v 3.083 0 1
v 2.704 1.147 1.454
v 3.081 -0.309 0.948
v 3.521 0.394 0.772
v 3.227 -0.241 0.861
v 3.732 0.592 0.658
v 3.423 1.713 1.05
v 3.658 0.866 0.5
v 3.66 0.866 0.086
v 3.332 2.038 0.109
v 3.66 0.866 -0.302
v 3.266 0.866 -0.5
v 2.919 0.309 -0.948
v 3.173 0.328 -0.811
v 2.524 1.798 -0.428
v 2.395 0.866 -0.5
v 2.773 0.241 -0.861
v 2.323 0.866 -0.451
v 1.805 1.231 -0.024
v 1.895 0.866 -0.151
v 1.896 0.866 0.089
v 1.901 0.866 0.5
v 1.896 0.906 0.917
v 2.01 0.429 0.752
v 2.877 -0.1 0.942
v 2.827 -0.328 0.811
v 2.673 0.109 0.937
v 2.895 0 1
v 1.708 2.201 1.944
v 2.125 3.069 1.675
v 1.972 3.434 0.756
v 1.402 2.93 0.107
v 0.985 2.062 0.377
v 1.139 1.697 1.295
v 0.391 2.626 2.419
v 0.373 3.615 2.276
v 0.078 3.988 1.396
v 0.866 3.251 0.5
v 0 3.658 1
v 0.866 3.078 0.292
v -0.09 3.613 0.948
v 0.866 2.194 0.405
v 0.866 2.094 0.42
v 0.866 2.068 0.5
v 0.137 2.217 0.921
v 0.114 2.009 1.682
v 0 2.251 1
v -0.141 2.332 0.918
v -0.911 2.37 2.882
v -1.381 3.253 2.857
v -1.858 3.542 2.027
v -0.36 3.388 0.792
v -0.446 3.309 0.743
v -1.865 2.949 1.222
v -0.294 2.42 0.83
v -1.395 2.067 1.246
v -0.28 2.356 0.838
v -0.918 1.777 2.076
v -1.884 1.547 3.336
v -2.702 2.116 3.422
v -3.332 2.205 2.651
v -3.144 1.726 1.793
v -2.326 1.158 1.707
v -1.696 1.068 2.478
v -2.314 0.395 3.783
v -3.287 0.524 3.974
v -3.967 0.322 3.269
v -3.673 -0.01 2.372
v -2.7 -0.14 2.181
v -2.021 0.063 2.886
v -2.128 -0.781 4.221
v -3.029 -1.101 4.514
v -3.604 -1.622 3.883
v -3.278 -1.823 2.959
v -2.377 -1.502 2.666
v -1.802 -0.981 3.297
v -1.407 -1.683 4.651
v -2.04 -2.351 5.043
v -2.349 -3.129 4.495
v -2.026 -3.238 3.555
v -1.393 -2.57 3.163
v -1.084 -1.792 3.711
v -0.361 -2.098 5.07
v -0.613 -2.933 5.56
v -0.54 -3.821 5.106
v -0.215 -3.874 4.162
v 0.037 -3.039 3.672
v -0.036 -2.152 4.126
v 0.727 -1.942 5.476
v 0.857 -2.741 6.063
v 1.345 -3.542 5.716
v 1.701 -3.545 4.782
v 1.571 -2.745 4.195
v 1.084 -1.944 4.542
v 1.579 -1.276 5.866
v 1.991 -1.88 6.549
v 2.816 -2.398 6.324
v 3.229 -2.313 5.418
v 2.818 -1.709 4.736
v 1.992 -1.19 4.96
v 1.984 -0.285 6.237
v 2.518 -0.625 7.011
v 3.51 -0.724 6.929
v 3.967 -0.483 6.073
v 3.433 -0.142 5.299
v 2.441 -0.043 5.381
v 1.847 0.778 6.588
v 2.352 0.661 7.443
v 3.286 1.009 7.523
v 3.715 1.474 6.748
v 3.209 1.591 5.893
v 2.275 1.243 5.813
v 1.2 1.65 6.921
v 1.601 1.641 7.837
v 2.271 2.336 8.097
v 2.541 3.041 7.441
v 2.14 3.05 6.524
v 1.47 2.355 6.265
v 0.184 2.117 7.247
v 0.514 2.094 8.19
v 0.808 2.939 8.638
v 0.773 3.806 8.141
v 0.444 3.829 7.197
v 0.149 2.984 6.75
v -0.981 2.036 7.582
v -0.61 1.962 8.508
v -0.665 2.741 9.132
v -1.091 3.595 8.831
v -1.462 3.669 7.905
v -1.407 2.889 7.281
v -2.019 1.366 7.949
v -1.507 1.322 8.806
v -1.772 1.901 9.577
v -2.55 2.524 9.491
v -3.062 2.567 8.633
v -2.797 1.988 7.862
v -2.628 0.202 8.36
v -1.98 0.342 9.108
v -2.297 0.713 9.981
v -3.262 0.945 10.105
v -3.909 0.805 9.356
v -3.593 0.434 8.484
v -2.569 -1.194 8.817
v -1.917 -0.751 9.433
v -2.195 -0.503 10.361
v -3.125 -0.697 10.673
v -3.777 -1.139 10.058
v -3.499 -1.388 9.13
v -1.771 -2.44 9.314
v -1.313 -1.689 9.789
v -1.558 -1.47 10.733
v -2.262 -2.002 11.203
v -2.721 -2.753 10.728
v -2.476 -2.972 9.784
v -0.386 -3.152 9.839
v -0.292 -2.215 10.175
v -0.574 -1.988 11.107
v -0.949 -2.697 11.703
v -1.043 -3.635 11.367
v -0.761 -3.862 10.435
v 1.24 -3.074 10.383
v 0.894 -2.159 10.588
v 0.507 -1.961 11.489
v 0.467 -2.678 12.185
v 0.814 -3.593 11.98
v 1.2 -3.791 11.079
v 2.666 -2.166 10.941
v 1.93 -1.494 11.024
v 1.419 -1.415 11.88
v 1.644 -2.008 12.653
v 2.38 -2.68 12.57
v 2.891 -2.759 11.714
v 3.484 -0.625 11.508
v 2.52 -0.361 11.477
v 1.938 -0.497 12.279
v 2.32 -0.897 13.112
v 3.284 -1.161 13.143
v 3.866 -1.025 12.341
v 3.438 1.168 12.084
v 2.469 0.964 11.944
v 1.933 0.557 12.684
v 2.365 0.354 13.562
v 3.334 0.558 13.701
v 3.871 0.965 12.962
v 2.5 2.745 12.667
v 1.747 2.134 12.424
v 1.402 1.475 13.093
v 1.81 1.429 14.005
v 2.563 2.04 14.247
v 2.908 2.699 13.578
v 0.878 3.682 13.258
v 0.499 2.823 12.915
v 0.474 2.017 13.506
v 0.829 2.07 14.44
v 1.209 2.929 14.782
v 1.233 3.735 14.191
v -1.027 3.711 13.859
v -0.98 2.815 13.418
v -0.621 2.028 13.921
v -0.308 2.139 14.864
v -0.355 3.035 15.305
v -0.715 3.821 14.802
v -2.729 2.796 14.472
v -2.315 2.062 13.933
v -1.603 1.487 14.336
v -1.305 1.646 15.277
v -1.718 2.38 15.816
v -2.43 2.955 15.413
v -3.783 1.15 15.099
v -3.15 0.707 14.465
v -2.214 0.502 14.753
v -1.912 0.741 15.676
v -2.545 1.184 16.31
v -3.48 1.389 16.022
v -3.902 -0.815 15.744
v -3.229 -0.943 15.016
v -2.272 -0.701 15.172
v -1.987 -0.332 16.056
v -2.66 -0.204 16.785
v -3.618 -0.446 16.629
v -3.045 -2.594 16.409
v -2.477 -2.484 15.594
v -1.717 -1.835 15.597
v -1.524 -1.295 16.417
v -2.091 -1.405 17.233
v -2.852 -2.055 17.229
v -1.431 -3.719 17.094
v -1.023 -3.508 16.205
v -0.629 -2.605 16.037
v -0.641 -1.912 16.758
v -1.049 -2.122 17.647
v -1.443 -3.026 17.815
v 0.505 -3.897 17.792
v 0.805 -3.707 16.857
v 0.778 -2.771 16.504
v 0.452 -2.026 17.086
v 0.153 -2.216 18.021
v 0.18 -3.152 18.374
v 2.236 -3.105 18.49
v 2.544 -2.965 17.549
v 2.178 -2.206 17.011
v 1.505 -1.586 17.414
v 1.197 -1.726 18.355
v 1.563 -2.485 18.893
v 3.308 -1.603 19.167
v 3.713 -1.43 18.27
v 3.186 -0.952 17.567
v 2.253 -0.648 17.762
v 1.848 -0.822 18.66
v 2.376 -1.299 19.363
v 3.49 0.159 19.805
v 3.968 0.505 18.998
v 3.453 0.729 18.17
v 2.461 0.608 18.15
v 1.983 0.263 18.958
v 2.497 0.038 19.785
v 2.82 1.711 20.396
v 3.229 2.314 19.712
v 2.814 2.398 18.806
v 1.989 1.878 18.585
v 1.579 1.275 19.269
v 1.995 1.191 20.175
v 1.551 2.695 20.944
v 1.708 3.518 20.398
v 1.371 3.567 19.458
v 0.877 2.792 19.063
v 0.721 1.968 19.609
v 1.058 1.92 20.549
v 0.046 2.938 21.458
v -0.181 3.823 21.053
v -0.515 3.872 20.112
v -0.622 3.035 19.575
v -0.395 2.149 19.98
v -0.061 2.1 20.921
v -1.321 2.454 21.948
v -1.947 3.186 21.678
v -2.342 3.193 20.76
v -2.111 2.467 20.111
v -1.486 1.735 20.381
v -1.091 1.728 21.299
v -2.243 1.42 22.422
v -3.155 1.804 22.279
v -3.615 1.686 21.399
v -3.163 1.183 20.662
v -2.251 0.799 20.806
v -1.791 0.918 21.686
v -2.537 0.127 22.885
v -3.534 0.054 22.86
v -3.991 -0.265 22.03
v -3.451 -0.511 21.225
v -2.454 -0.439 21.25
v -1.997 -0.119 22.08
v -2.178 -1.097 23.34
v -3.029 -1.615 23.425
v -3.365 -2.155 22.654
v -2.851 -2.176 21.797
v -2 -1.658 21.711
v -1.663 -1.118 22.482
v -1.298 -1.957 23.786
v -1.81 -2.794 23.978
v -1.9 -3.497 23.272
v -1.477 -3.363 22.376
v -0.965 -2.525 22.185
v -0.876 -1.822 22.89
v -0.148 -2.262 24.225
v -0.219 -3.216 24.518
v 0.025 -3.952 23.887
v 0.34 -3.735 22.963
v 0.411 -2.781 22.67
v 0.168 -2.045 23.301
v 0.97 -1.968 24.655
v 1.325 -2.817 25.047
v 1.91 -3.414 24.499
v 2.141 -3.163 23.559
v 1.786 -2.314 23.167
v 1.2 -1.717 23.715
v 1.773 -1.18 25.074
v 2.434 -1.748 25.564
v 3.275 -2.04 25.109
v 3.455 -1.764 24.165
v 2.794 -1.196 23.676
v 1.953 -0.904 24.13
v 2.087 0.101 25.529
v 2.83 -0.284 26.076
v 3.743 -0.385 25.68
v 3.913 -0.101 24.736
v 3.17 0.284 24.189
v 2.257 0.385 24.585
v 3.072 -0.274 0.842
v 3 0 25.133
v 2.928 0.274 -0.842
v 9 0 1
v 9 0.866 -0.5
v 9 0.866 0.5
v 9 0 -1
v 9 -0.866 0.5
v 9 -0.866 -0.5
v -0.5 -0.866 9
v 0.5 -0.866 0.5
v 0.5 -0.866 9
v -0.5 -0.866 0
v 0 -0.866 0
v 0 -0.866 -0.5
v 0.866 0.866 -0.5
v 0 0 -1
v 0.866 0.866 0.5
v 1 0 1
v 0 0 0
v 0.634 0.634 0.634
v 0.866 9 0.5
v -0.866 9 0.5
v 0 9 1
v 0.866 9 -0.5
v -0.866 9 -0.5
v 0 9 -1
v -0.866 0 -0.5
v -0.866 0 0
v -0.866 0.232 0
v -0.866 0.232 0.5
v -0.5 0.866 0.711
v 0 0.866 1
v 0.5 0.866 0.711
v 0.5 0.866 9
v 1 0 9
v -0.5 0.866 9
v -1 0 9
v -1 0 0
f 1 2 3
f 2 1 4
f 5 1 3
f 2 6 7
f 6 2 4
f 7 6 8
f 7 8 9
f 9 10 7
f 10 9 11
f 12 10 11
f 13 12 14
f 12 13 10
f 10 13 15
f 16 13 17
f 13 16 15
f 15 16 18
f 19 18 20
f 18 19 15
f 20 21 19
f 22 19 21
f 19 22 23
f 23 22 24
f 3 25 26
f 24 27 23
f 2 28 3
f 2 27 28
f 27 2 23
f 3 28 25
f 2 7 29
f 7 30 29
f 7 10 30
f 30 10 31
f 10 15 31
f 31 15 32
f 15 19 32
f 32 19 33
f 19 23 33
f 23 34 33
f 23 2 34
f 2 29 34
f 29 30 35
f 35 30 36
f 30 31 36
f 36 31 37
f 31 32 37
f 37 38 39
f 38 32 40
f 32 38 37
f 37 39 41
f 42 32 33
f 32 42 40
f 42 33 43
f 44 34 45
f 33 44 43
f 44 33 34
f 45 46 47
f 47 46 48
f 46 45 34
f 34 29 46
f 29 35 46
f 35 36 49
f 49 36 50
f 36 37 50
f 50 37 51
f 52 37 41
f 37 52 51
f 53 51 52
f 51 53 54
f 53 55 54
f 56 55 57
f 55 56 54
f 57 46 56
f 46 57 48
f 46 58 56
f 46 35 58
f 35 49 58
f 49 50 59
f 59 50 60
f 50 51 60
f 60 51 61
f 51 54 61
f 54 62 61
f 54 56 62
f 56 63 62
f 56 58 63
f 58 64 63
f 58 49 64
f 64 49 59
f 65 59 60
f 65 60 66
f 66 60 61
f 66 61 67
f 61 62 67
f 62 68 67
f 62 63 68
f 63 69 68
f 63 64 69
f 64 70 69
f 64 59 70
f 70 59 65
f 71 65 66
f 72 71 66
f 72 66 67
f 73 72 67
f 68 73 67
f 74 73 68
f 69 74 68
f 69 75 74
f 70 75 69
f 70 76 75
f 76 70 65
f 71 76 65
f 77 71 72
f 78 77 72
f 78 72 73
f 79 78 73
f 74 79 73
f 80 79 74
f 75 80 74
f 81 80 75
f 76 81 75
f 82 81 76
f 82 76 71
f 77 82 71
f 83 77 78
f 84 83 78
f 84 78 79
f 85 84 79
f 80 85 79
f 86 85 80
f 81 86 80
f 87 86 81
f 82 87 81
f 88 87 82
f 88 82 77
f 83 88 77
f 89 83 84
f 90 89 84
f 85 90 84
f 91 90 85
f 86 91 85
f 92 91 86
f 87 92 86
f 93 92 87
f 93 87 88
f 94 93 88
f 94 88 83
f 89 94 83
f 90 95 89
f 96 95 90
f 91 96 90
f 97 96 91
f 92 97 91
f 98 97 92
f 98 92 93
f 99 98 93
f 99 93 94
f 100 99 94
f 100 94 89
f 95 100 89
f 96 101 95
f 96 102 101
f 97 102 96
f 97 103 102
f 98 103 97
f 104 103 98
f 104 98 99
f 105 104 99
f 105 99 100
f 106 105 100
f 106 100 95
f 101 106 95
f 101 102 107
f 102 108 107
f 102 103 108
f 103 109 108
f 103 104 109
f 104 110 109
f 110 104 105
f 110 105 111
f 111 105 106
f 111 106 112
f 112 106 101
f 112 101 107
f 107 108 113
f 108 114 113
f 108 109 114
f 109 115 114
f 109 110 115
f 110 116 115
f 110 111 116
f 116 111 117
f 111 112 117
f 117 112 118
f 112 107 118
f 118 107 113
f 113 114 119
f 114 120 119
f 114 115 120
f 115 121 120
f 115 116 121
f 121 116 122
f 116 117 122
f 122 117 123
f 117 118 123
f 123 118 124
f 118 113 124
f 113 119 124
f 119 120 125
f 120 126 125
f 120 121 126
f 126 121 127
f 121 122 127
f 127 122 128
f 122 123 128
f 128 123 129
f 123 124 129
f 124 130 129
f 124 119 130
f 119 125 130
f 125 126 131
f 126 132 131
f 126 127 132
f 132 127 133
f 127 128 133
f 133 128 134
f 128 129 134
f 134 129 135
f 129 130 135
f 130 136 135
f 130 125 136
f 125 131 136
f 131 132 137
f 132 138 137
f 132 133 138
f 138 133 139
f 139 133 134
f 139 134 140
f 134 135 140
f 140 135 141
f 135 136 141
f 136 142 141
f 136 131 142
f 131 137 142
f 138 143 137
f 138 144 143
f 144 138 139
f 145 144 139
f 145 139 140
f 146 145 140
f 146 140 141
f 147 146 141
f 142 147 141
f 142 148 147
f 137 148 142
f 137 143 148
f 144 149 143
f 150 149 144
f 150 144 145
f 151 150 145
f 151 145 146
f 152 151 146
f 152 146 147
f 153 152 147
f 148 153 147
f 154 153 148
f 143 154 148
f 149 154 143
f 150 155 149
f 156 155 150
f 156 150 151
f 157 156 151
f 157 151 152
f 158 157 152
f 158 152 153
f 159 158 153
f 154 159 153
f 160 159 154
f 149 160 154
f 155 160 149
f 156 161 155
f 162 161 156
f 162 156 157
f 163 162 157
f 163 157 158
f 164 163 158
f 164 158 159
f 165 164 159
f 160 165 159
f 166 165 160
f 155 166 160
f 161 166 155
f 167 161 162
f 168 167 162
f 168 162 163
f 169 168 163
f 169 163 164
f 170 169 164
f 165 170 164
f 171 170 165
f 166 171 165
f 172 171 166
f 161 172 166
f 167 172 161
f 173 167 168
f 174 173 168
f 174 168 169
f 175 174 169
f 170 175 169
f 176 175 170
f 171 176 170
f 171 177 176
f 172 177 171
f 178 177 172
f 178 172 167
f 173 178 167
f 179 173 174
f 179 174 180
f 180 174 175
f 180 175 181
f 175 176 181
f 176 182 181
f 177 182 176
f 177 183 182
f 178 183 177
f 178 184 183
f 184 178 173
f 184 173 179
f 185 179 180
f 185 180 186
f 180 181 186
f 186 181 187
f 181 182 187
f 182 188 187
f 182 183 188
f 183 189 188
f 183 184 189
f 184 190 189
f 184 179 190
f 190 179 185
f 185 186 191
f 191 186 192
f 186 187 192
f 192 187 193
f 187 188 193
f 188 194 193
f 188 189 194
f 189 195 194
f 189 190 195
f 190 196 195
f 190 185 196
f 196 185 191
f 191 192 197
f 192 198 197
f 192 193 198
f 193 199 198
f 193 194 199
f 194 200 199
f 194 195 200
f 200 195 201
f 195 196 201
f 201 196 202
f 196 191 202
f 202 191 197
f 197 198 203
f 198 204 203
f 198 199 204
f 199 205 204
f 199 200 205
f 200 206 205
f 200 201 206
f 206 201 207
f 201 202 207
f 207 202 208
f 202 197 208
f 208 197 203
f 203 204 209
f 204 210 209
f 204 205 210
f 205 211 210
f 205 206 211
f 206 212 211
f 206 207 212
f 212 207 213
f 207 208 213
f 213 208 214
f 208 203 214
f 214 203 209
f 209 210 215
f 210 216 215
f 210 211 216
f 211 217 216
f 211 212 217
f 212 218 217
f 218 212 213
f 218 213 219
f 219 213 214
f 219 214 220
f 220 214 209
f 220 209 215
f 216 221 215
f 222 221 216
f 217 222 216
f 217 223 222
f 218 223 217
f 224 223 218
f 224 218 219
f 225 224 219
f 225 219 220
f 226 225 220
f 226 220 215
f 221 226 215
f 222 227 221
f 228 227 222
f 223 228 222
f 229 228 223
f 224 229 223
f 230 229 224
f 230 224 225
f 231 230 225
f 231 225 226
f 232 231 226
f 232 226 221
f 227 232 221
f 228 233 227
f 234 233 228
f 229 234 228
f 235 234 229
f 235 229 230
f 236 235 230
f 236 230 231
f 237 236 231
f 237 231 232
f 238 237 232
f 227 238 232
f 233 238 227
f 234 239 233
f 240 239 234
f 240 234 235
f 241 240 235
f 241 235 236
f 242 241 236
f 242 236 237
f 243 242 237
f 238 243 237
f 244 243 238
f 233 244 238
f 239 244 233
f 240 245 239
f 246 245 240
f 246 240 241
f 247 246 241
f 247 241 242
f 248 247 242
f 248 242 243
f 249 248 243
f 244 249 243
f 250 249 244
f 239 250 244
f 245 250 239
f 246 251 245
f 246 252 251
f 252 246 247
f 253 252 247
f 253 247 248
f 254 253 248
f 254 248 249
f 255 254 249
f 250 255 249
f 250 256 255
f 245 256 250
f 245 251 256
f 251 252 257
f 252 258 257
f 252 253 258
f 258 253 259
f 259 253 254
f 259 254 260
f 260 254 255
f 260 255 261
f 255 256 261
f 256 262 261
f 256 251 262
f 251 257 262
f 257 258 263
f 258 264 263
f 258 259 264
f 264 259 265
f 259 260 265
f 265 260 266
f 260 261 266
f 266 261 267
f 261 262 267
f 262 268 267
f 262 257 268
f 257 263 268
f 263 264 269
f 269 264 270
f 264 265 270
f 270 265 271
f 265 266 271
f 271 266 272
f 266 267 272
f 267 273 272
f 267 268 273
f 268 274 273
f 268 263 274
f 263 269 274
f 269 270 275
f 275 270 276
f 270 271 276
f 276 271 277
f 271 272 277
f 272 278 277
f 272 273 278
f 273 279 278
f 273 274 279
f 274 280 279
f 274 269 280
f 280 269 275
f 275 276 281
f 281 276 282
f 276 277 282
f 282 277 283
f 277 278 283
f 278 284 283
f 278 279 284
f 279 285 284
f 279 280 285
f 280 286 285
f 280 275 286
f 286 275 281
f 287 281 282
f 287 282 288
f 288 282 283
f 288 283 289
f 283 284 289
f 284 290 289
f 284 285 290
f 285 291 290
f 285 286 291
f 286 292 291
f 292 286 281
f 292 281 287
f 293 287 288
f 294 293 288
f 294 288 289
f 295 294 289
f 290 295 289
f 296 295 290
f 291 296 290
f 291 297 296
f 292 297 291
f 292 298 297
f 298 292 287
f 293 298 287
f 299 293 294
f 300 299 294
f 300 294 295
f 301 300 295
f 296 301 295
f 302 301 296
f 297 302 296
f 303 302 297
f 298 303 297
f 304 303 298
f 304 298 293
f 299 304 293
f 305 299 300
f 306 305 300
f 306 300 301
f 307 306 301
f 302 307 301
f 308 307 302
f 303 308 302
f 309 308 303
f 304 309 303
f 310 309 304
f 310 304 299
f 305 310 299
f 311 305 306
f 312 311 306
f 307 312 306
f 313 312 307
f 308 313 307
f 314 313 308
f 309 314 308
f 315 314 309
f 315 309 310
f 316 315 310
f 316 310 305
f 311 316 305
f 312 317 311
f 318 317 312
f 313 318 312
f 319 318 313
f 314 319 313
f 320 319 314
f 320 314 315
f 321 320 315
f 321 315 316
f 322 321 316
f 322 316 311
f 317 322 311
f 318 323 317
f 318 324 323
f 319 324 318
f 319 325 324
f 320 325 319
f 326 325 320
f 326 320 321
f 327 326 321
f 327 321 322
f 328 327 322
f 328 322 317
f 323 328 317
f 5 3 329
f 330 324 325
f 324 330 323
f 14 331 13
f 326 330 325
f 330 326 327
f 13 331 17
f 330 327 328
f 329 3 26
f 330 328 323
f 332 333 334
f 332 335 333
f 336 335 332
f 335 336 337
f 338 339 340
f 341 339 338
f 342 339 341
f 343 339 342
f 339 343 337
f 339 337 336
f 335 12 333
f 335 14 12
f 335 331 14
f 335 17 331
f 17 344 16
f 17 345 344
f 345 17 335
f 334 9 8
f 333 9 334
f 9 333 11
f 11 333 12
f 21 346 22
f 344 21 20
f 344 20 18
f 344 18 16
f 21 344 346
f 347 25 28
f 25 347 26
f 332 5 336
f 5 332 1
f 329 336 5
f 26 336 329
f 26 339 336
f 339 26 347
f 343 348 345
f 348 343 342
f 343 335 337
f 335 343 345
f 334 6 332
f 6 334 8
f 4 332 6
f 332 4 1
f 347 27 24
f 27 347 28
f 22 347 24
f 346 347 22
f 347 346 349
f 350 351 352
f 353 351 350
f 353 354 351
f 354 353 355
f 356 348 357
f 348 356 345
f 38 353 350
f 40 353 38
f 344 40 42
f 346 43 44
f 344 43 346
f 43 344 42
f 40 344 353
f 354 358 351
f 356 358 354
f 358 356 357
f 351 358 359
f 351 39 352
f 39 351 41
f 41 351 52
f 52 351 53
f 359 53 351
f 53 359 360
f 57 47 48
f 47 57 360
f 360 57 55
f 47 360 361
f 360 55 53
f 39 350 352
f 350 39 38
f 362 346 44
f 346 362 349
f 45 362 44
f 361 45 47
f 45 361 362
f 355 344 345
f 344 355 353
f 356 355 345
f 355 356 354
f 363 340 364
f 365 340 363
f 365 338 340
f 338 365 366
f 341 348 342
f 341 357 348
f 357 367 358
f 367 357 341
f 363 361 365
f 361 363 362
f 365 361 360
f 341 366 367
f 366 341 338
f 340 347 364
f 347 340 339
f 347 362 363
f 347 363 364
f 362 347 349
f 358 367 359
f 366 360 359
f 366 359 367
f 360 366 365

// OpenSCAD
union() {
	polyhedron(convexity = 10, faces = [[0, 6, 1], [1, 6, 7], [1, 7, 2], [2, 7, 8], [2, 8, 3], [3, 8, 9], [3, 9, 4], [4, 9, 10], [4, 10, 5], [5, 10, 11], [5, 11, 0], [0, 11, 6], [6, 12, 7], [7, 12, 13], [7, 13, 8], [8, 13, 14], [8, 14, 9], [9, 14, 15], [9, 15, 10], [10, 15, 16], [10, 16, 11], [11, 16, 17], [11, 17, 6], [6, 17, 12], [12, 18, 13], [13, 18, 19], [13, 19, 14], [14, 19, 20], [14, 20, 15], [15, 20, 21], [15, 21, 16], [16, 21, 22], [16, 22, 17], [17, 22, 23], [17, 23, 12], [12, 23, 18], [18, 24, 19], [19, 24, 25], [19, 25, 20], [20, 25, 26], [20, 26, 21], [21, 26, 27], [21, 27, 22], [22, 27, 28], [22, 28, 23], [23, 28, 29], [23, 29, 18], [18, 29, 24], [24, 30, 25], [25, 30, 31], [25, 31, 26], [26, 31, 32], [26, 32, 27], [27, 32, 33], [27, 33, 28], [28, 33, 34], [28, 34, 29], [29, 34, 35], [29, 35, 24], [24, 35, 30], [30, 36, 31], [31, 36, 37], [31, 37, 32], [32, 37, 38], [32, 38, 33], [33, 38, 39], [33, 39, 34], [34, 39, 40], [34, 40, 35], [35, 40, 41], [35, 41, 30], [30, 41, 36], [36, 42, 37], [37, 42, 43], [37, 43, 38], [38, 43, 44], [38, 44, 39], [39, 44, 45], [39, 45, 40], [40, 45, 46], [40, 46, 41], [41, 46, 47], [41, 47, 36], [36, 47, 42], [42, 48, 43], [43, 48, 49], [43, 49, 44], [44, 49, 50], [44, 50, 45], [45, 50, 51], [45, 51, 46], [46, 51, 52], [46, 52, 47], [47, 52, 53], [47, 53, 42], [42, 53, 48], [48, 54, 49], [49, 54, 55], [49, 55, 50], [50, 55, 56], [50, 56, 51], [51, 56, 57], [51, 57, 52], [52, 57, 58], [52, 58, 53], [53, 58, 59], [53, 59, 48], [48, 59, 54], [54, 60, 55], [55, 60, 61], [55, 61, 56], [56, 61, 62], [56, 62, 57], [57, 62, 63], [57, 63, 58], [58, 63, 64], [58, 64, 59], [59, 64, 65], [59, 65, 54], [54, 65, 60], [60, 66, 61], [61, 66, 67], [61, 67, 62], [62, 67, 68], [62, 68, 63], [63, 68, 69], [63, 69, 64], [64, 69, 70], [64, 70, 65], [65, 70, 71], [65, 71, 60], [60, 71, 66], [66, 72, 67], [67, 72, 73], [67, 73, 68], [68, 73, 74], [68, 74, 69], [69, 74, 75], [69, 75, 70], [70, 75, 76], [70, 76, 71], [71, 76, 77], [71, 77, 66], [66, 77, 72], [72, 78, 73], [73, 78, 79], [73, 79, 74], [74, 79, 80], [74, 80, 75], [75, 80, 81], [75, 81, 76], [76, 81, 82], [76, 82, 77], [77, 82, 83], [77, 83, 72], [72, 83, 78], [78, 84, 79], [79, 84, 85], [79, 85, 80], [80, 85, 86], [80, 86, 81], [81, 86, 87], [81, 87, 82], [82, 87, 88], [82, 88, 83], [83, 88, 89], [83, 89, 78], [78, 89, 84], [84, 90, 85], [85, 90, 91], [85, 91, 86], [86, 91, 92], [86, 92, 87], [87, 92, 93], [87, 93, 88], [88, 93, 94], [88, 94, 89], [89, 94, 95], [89, 95, 84], [84, 95, 90], [90, 96, 91], [91, 96, 97], [91, 97, 92], [92, 97, 98], [92, 98, 93], [93, 98, 99], [93, 99, 94], [94, 99, 100], [94, 100, 95], [95, 100, 101], [95, 101, 90], [90, 101, 96], [96, 102, 97], [97, 102, 103], [97, 103, 98], [98, 103, 104], [98, 104, 99], [99, 104, 105], [99, 105, 100], [100, 105, 106], [100, 106, 101], [101, 106, 107], [101, 107, 96], [96, 107, 102], [102, 108, 103], [103, 108, 109], [103, 109, 104], [104, 109, 110], [104, 110, 105], [105, 110, 111], [105, 111, 106], [106, 111, 112], [106, 112, 107], [107, 112, 113], [107, 113, 102], [102, 113, 108], [108, 114, 109], [109, 114, 115], [109, 115, 110], [110, 115, 116], [110, 116, 111], [111, 116, 117], [111, 117, 112], [112, 117, 118], [112, 118, 113], [113, 118, 119], [113, 119, 108], [108, 119, 114], [114, 120, 115], [115, 120, 121], [115, 121, 116], [116, 121, 122], [116, 122, 117], [117, 122, 123], [117, 123, 118], [118, 123, 124], [118, 124, 119], [119, 124, 125], [119, 125, 114], [114, 125, 120], [120, 126, 121], [121, 126, 127], [121, 127, 122], [122, 127, 128], [122, 128, 123], [123, 128, 129], [123, 129, 124], [124, 129, 130], [124, 130, 125], [125, 130, 131], [125, 131, 120], [120, 131, 126], [126, 132, 127], [127, 132, 133], [127, 133, 128], [128, 133, 134], [128, 134, 129], [129, 134, 135], [129, 135, 130], [130, 135, 136], [130, 136, 131], [131, 136, 137], [131, 137, 126], [126, 137, 132], [132, 138, 133], [133, 138, 139], [133, 139, 134], [134, 139, 140], [134, 140, 135], [135, 140, 141], [135, 141, 136], [136, 141, 142], [136, 142, 137], [137, 142, 143], [137, 143, 132], [132, 143, 138], [138, 144, 139], [139, 144, 145], [139, 145, 140], [140, 145, 146], [140, 146, 141], [141, 146, 147], [141, 147, 142], [142, 147, 148], [142, 148, 143], [143, 148, 149], [143, 149, 138], [138, 149, 144], [144, 150, 145], [145, 150, 151], [145, 151, 146], [146, 151, 152], [146, 152, 147], [147, 152, 153], [147, 153, 148], [148, 153, 154], [148, 154, 149], [149, 154, 155], [149, 155, 144], [144, 155, 150], [150, 156, 151], [151, 156, 157], [151, 157, 152], [152, 157, 158], [152, 158, 153], [153, 158, 159], [153, 159, 154], [154, 159, 160], [154, 160, 155], [155, 160, 161], [155, 161, 150], [150, 161, 156], [156, 162, 157], [157, 162, 163], [157, 163, 158], [158, 163, 164], [158, 164, 159], [159, 164, 165], [159, 165, 160], [160, 165, 166], [160, 166, 161], [161, 166, 167], [161, 167, 156], [156, 167, 162], [162, 168, 163], [163, 168, 169], [163, 169, 164], [164, 169, 170], [164, 170, 165], [165, 170, 171], [165, 171, 166], [166, 171, 172], [166, 172, 167], [167, 172, 173], [167, 173, 162], [162, 173, 168], [168, 174, 169], [169, 174, 175], [169, 175, 170], [170, 175, 176], [170, 176, 171], [171, 176, 177], [171, 177, 172], [172, 177, 178], [172, 178, 173], [173, 178, 179], [173, 179, 168], [168, 179, 174], [174, 180, 175], [175, 180, 181], [175, 181, 176], [176, 181, 182], [176, 182, 177], [177, 182, 183], [177, 183, 178], [178, 183, 184], [178, 184, 179], [179, 184, 185], [179, 185, 174], [174, 185, 180], [180, 186, 181], [181, 186, 187], [181, 187, 182], [182, 187, 188], [182, 188, 183], [183, 188, 189], [183, 189, 184], [184, 189, 190], [184, 190, 185], [185, 190, 191], [185, 191, 180], [180, 191, 186], [186, 192, 187], [187, 192, 193], [187, 193, 188], [188, 193, 194], [188, 194, 189], [189, 194, 195], [189, 195, 190], [190, 195, 196], [190, 196, 191], [191, 196, 197], [191, 197, 186], [186, 197, 192], [192, 198, 193], [193, 198, 199], [193, 199, 194], [194, 199, 200], [194, 200, 195], [195, 200, 201], [195, 201, 196], [196, 201, 202], [196, 202, 197], [197, 202, 203], [197, 203, 192], [192, 203, 198], [198, 204, 199], [199, 204, 205], [199, 205, 200], [200, 205, 206], [200, 206, 201], [201, 206, 207], [201, 207, 202], [202, 207, 208], [202, 208, 203], [203, 208, 209], [203, 209, 198], [198, 209, 204], [204, 210, 205], [205, 210, 211], [205, 211, 206], [206, 211, 212], [206, 212, 207], [207, 212, 213], [207, 213, 208], [208, 213, 214], [208, 214, 209], [209, 214, 215], [209, 215, 204], [204, 215, 210], [210, 216, 211], [211, 216, 217], [211, 217, 212], [212, 217, 218], [212, 218, 213], [213, 218, 219], [213, 219, 214], [214, 219, 220], [214, 220, 215], [215, 220, 221], [215, 221, 210], [210, 221, 216], [216, 222, 217], [217, 222, 223], [217, 223, 218], [218, 223, 224], [218, 224, 219], [219, 224, 225], [219, 225, 220], [220, 225, 226], [220, 226, 221], [221, 226, 227], [221, 227, 216], [216, 227, 222], [222, 228, 223], [223, 228, 229], [223, 229, 224], [224, 229, 230], [224, 230, 225], [225, 230, 231], [225, 231, 226], [226, 231, 232], [226, 232, 227], [227, 232, 233], [227, 233, 222], [222, 233, 228], [228, 234, 229], [229, 234, 235], [229, 235, 230], [230, 235, 236], [230, 236, 231], [231, 236, 237], [231, 237, 232], [232, 237, 238], [232, 238, 233], [233, 238, 239], [233, 239, 228], [228, 239, 234], [234, 240, 235], [235, 240, 241], [235, 241, 236], [236, 241, 242], [236, 242, 237], [237, 242, 243], [237, 243, 238], [238, 243, 244], [238, 244, 239], [239, 244, 245], [239, 245, 234], [234, 245, 240], [240, 246, 241], [241, 246, 247], [241, 247, 242], [242, 247, 248], [242, 248, 243], [243, 248, 249], [243, 249, 244], [244, 249, 250], [244, 250, 245], [245, 250, 251], [245, 251, 240], [240, 251, 246], [246, 252, 247], [247, 252, 253], [247, 253, 248], [248, 253, 254], [248, 254, 249], [249, 254, 255], [249, 255, 250], [250, 255, 256], [250, 256, 251], [251, 256, 257], [251, 257, 246], [246, 257, 252], [252, 258, 253], [253, 258, 259], [253, 259, 254], [254, 259, 260], [254, 260, 255], [255, 260, 261], [255, 261, 256], [256, 261, 262], [256, 262, 257], [257, 262, 263], [257, 263, 252], [252, 263, 258], [258, 264, 259], [259, 264, 265], [259, 265, 260], [260, 265, 266], [260, 266, 261], [261, 266, 267], [261, 267, 262], [262, 267, 268], [262, 268, 263], [263, 268, 269], [263, 269, 258], [258, 269, 264], [264, 270, 265], [265, 270, 271], [265, 271, 266], [266, 271, 272], [266, 272, 267], [267, 272, 273], [267, 273, 268], [268, 273, 274], [268, 274, 269], [269, 274, 275], [269, 275, 264], [264, 275, 270], [270, 276, 271], [271, 276, 277], [271, 277, 272], [272, 277, 278], [272, 278, 273], [273, 278, 279], [273, 279, 274], [274, 279, 280], [274, 280, 275], [275, 280, 281], [275, 281, 270], [270, 281, 276], [276, 282, 277], [277, 282, 283], [277, 283, 278], [278, 283, 284], [278, 284, 279], [279, 284, 285], [279, 285, 280], [280, 285, 286], [280, 286, 281], [281, 286, 287], [281, 287, 276], [276, 287, 282], [282, 288, 283], [283, 288, 289], [283, 289, 284], [284, 289, 290], [284, 290, 285], [285, 290, 291], [285, 291, 286], [286, 291, 292], [286, 292, 287], [287, 292, 293], [287, 293, 282], [282, 293, 288], [288, 294, 289], [289, 294, 295], [289, 295, 290], [290, 295, 296], [290, 296, 291], [291, 296, 297], [291, 297, 292], [292, 297, 298], [292, 298, 293], [293, 298, 299], [293, 299, 288], [288, 299, 294], [1, 300, 0], [294, 301, 295], [2, 300, 1], [295, 301, 296], [3, 300, 2], [296, 301, 297], [4, 300, 3], [297, 301, 298], [5, 300, 4], [298, 301, 299], [0, 300, 5], [299, 301, 294]], points = [[3.0810087502, -0.3089214740, 0.9476313129], [3.8782062995, 0.0652105764, 0.4738156565], [3.7971975492, 0.3741320505, -0.4738156565], [2.9189912498, 0.3089214740, -0.9476313129], [2.1217937005, -0.0652105764, -0.4738156565], [2.2028024508, -0.3741320505, 0.4738156565], [2.7042789242, 1.1466598966, 1.4541337051], [3.4225496959, 1.7128669475, 1.0497864854], [3.3322268841, 2.0383597069, 0.1085658666], [2.5236333006, 1.7976454154, -0.4283075325], [1.8053625289, 1.2314383645, -0.0239603128], [1.8956853407, 0.9059456052, 0.9172603060], [1.7084601032, 2.2009545168, 1.9443376727], [2.1250694272, 3.0692223543, 1.6749909935], [1.9717870289, 3.4336961265, 0.7564794935], [1.4018953066, 2.9299020612, 0.1073146725], [0.9852859827, 2.0616342237, 0.3766613517], [1.1385683810, 1.6971604515, 1.2951728517], [0.3908859976, 2.6255273844, 2.4185436426], [0.3728424364, 3.6151148193, 2.2757460986], [0.0781111715, 3.9880460835, 1.3959417149], [-0.1985765322, 3.3713899129, 0.6589348752], [-0.1805329710, 2.3818024779, 0.8017324192], [0.1141982939, 2.0088712137, 1.6815368029], [-0.9105575634, 2.3704884403, 2.8815417059], [-1.3805732027, 3.2528003168, 2.8568222473], [-1.8576305099, 3.5421097955, 2.0269328866], [-1.8646721780, 2.9491073979, 1.2217629845], [-1.3946565388, 2.0667955215, 1.2464824431], [-0.9175992315, 1.7774860427, 2.0763718038], [-1.8841579039, 1.5471102404, 3.3358997637], [-2.7023811781, 2.1155218530, 3.4220328710], [-3.3324875889, 2.2050163162, 2.6506985387], [-3.1443707255, 1.7260991669, 1.7932310993], [-2.3261474512, 1.1576875543, 1.7070979920], [-1.6960410404, 1.0681930911, 2.4784323243], [-2.3142796550, 0.3947547144, 3.7825876141], [-3.2872298728, 0.5240567863, 3.9740265023], [-3.9667863960, 0.3215127318, 3.2689174060], [-3.6733927015, -0.0103333946, 2.3723694215], [-2.7004424837, -0.1396354664, 2.1809305333], [-2.0208859605, 0.0629085881, 2.8860396296], [-2.1280235244, -0.7807782906, 4.2214231717], [-3.0288365899, -1.1013231042, 4.5143170834], [-3.6037196692, -1.6221960310, 3.8832855158], [-3.2777896831, -1.8225241441, 2.9593600365], [-2.3769766176, -1.5019793305, 2.6664661248], [-1.8020935382, -0.9811064037, 3.2974976924], [-1.4070349128, -1.6833494561, 4.6513331247], [-2.0395463274, -2.3513862460, 5.0433231218], [-2.3488613950, -3.1285535537, 4.4952946875], [-2.0256650480, -3.2376840715, 3.5552762561], [-1.3931536334, -2.5696472816, 3.1632862590], [-1.0838385658, -1.7924799739, 3.7113146933], [-0.3614283609, -2.0983000193, 5.0704900625], [-0.6133965364, -2.9329128470, 5.5603201007], [-0.5400372532, -3.8207501666, 5.1060478149], [-0.2147097945, -3.8739746584, 4.1619454910], [0.0372583810, -3.0393618307, 3.6721154528], [-0.0361009022, -2.1515245111, 4.1263877385], [0.7272916681, -1.9418848301, 5.4764167102], [0.8574526973, -2.7410463178, 6.0632719077], [1.3445110585, -3.5423993568, 5.7159860606], [1.7014083906, -3.5445909080, 4.7818450158], [1.5712473614, -2.7454294202, 4.1949898183], [1.0841890002, -1.9440763813, 4.5422756654], [1.5790211108, -1.2759049545, 5.8662005428], [1.9908270723, -1.8798950131, 6.5485581171], [2.8160468271, -2.3983216501, 6.3244015236], [3.2294606204, -2.3127582284, 5.4178873558], [2.8176546589, -1.7087681699, 4.7355297815], [1.9924349041, -1.1903415329, 4.9596863750], [1.9836783537, -0.2846141680, 6.2370738259], [2.5179154344, -0.6252765683, 7.0107274115], [3.5096071223, -0.7242938854, 6.9286106212], [3.9670617293, -0.4826488021, 6.0728402453], [3.4328246485, -0.1419864018, 5.2991866597], [2.4411329607, -0.0429690847, 5.3813034500], [1.8467009739, 0.7777563961, 6.5877648648], [2.3521720183, 0.6610528434, 7.4426796583], [3.2862213164, 1.0090974619, 7.5227849154], [3.7147995701, 1.4738456332, 6.7479753790], [3.2093285258, 1.5905491859, 5.8930605855], [2.2752792277, 1.2425045674, 5.8129553284], [1.2002707150, 1.6502689215, 6.9209848572], [1.6009928273, 1.6408073885, 7.8371356461], [2.2711915179, 2.3360329144, 8.0969339971], [2.5406680962, 3.0407199733, 7.4405815592], [2.1399459838, 3.0501815063, 6.5244307703], [1.4697472932, 2.3549559804, 6.2646324193], [0.1844237277, 2.1169316801, 7.2465156331], [0.5139032279, 2.0943399625, 8.1904080387], [0.8082791852, 2.9389536327, 8.6375887001], [0.7731756425, 3.8061590204, 8.1408769559], [0.4436961423, 3.8287507380, 7.1969845503], [0.1493201850, 2.9841370678, 6.7498038889], [-0.9812150916, 2.0362936917, 7.5821309326], [-0.6102807221, 1.9622064639, 8.5078300069], [-0.6651607937, 2.7413180384, 9.1323084551], [-1.0909752349, 3.5945168406, 8.8310878290], [-1.4619096045, 3.6686040684, 7.9053887547], [-1.4070295328, 2.8894924939, 7.2809103065], [-2.0187912179, 1.3658440583, 7.9485309485], [-1.5065230925, 1.3222038515, 8.8062470437], [-1.7720697497, 1.9010449791, 9.5772385623], [-2.5498845323, 2.5235263136, 9.4905139857], [-3.0621526577, 2.5671665204, 8.6327978905], [-2.7966060005, 1.9883253927, 7.8618063719], [-2.6278542709, 0.2019997867, 8.3597222170], [-1.9798678402, 0.3415788220, 9.1084753663], [-2.2966910403, 0.7130549214, 9.9811887027], [-3.2615006711, 0.9449519855, 10.1051488898], [-3.9094871018, 0.8053729502, 9.3563957405], [-3.5926639017, 0.4338968508, 8.4836824041], [-2.5692831603, -1.1937206170, 8.8174047388], [-1.9172278847, -0.7512143391, 9.4330443344], [-2.1951119655, -0.5028183762, 10.3609882353], [-3.1250513218, -0.6969286911, 10.6732925406], [-3.7771065974, -1.1394349690, 10.0576529450], [-3.4992225166, -1.3878309319, 9.1297090441], [-1.7713643869, -2.4398500288, 9.3139403154], [-1.3125271358, -1.6886814990, 9.7885077151], [-1.5580654196, -1.4696654615, 10.7328291257], [-2.2624409547, -2.0018179537, 11.2025831366], [-2.7212782058, -2.7529864834, 10.7280157369], [-2.4757399219, -2.9720025210, 9.7836943263], [-0.3862622000, -3.1520839434, 9.8388633904], [-0.2924852304, -2.2149447336, 10.1749823893], [-0.5737858323, -1.9876445267, 11.1072938112], [-0.9488634037, -2.6974835297, 11.7034862342], [-1.0426403733, -3.6346227395, 11.3673672353], [-0.7613397715, -3.8619229464, 10.4350558134], [1.2398024533, -3.0741733191, 10.3832199312], [0.8935352906, -2.1587538443, 10.5884179755], [0.5073155973, -1.9605840844, 11.4892859429], [0.4673630665, -2.6778337991, 12.1849558660], [0.8136302292, -3.5932532739, 11.9797578217], [1.1998499225, -3.7914230338, 11.0788898543], [2.6656848600, -2.1663344377, 10.9408680197], [1.9300027402, -1.4941086746, 11.0238399553], [1.4193659305, -1.4148218887, 11.8799729205], [1.6444112406, -2.0077608659, 12.6531339501], [2.3800933604, -2.6799866290, 12.5701620145], [2.8907301701, -2.7592734149, 11.7140290493], [3.4838924912, -0.6248177692, 11.5082089675], [2.5198965339, -0.3607506131, 11.4768987236], [1.9378886318, -0.4968965956, 12.2786038273], [2.3198766870, -0.8971097343, 13.1116191749], [3.2838726443, -1.1611768904, 13.1429294188], [3.8658805464, -1.0250309078, 12.3412243151], [3.4383817385, 1.1679340719, 12.0835396848], [2.4693505687, 0.9639561436, 11.9443578012], [1.9328534193, 0.5569858234, 12.6836452739], [2.3653874398, 0.3539934316, 13.5621146302], [3.3344186096, 0.5579713599, 13.7012965138], [3.8709157589, 0.9649416800, 12.9620090411], [2.4996481653, 2.7453622727, 12.6665073840], [1.7466159555, 2.1336423219, 12.4241415598], [1.4020158405, 1.4753277010, 13.0933744196], [1.8104479353, 1.4287330309, 14.0049731036], [2.5634801451, 2.0404529817, 14.2473389278], [2.9080802601, 2.6987676026, 13.5781060680], [0.8781620562, 3.6823796532, 13.2577612477], [0.4986146025, 2.8229309274, 12.9152826090], [0.4740353062, 2.0165548332, 13.5061746914], [0.8290034635, 2.0696274650, 14.4395454125], [1.2085509173, 2.9290761909, 14.7820240512], [1.2331302136, 3.7354522850, 14.1911319688], [-1.0267083151, 3.7110426523, 13.8587628587], [-0.9796668448, 2.8146925327, 13.4179187103], [-0.6205213316, 2.0284336169, 13.9207222681], [-0.3084172886, 2.1385248208, 14.8643699742], [-0.3554587589, 3.0348749404, 15.3052141225], [-0.7146042722, 3.8211338562, 14.8024105648], [-2.7288656139, 2.7960387479, 14.4716789870], [-2.3153136740, 2.0617162718, 13.9333990468], [-1.6033507309, 1.4865115151, 14.3361995625], [-1.3049397277, 1.6456292345, 15.2772800185], [-1.7184916676, 2.3799517107, 15.8155599586], [-2.4304546107, 2.9551564674, 15.4127594429], [-3.7825963790, 1.1501261680, 15.0992456339], [-3.1495921505, 0.7069353844, 14.4645113777], [-2.2141630125, 0.5021338704, 14.7526583328], [-1.9117381031, 0.7405231401, 15.6755395442], [-2.5447423316, 1.1837139237, 16.3102738004], [-3.4801714695, 1.3885154377, 16.0221268452], [-3.9023864615, -0.8153248015, 15.7444127903], [-3.2294814414, -0.9429126181, 15.0157700912], [-2.2717724508, -0.7010637027, 15.1716629762], [-1.9869684805, -0.3316269707, 16.0561985603], [-2.6598735006, -0.2040391541, 16.7848412594], [-3.6175824911, -0.4458880695, 16.6289483744], [-3.0449238873, -2.5939113601, 16.4094381720], [-2.4772904523, -2.4840103973, 15.5935251486], [-1.7167044401, -1.8347842232, 15.5973057381], [-1.5237518629, -1.2954590118, 16.4169993512], [-2.0913852979, -1.4053599745, 17.2329123747], [-2.8519713101, -2.0545861486, 17.2291317851], [-1.4308452900, -3.7187301230, 17.0939905400], [-1.0234933549, -3.5083748261, 16.2052751469], [-0.6287432282, -2.6050499693, 16.0374164547], [-0.6413450366, -1.9120804093, 16.7582731558], [-1.0486969716, -2.1224357062, 17.6469885490], [-1.4434470983, -3.0257605630, 17.8148472411], [0.5053600798, -3.8967394552, 17.7921830537], [0.8046402943, -3.7066724020, 16.8571398095], [0.7780798996, -2.7714782970, 16.5040016901], [0.4522392904, -2.0263512452, 17.0859068148], [0.1529590759, -2.2164182985, 18.0209500589], [0.1795194706, -3.1516124035, 18.3740881784], [2.2362527122, -3.1048677270, 18.4900609798], [2.5441084386, -2.9650146095, 17.5489627080], [2.1783251320, -2.2056413299, 17.0108597487], [1.5046860989, -1.5861211678, 17.4138550612], [1.1968303726, -1.7259742853, 18.3549533330], [1.5626136792, -2.4853475649, 18.8930562924], [3.3083818233, -1.6034566208, 19.1673311185], [3.7131600226, -1.4298719064, 18.2695433060], [3.1855284714, -0.9522163002, 17.5670832943], [2.2531187208, -0.6481454084, 17.7624110951], [1.8483405214, -0.8217301229, 18.6601989076], [2.3759720727, -1.2993857291, 19.3626589193], [3.4897639277, 0.1592010511, 19.8054495302], [3.9678304661, 0.5045408236, 18.9978649672], [3.4534365799, 0.7289712576, 18.1701996301], [2.4609761553, 0.6080619191, 18.1501188561], [1.9829096169, 0.2627221465, 18.9577034191], [2.4973035031, 0.0382917125, 19.7853687561], [2.8198261940, 1.7107406479, 20.3964021922], [3.2294539742, 2.3139673707, 19.7120611933], [2.8138686458, 2.3975583142, 18.8063562806], [1.9886555372, 1.8779225350, 18.5849923667], [1.5790277570, 1.2746958123, 19.2693333655], [1.9946130854, 1.1911048687, 20.1750382782], [1.5512366706, 2.6949197435, 20.9439149705], [1.7078352956, 3.5182435633, 20.3983741760], [1.3709486544, 3.5665616889, 19.4580695713], [0.8774633881, 2.7915559946, 19.0633057610], [0.7208647631, 1.9682321748, 19.6088465554], [1.0577514043, 1.9199140492, 20.5491511601], [0.0460864033, 2.9375554000, 21.4577885102], [-0.1810649298, 3.8232772191, 21.0529439337], [-0.5152204108, 3.8718591579, 20.1116788756], [-0.6222245587, 3.0347192777, 19.5752583938], [-0.3950732257, 2.1489974586, 19.9801029703], [-0.0609177447, 2.1004155198, 20.9213680285], [-1.3212807935, 2.4535840171, 21.9480617473], [-1.9466488158, 3.1857820119, 21.6782452669], [-2.3417180027, 3.1927147586, 20.7596200579], [-2.1114191672, 2.4674495105, 20.1108113293], [-1.4860511449, 1.7352515157, 20.3806278097], [-1.0909819581, 1.7283187690, 21.2992530187], [-2.2429611217, 1.4204412294, 22.4223150141], [-3.1551582833, 1.8043420252, 22.2790791340], [-3.6151037653, 1.6855520132, 21.3991137445], [-3.1628520857, 1.1828612054, 20.6623842351], [-2.2506549241, 0.7989604095, 20.8056201152], [-1.7907094421, 0.9177504215, 21.6855855047], [-2.5365681527, 0.1269524369, 22.8853475683], [-3.5335991930, 0.0541676273, 22.8602183789], [-3.9908672186, -0.2649954695, 22.0301335216], [-3.4511042038, -0.5113737568, 21.2251778536], [-2.4540731635, -0.4385889472, 21.2503070429], [-1.9968051379, -0.1194258503, 22.0803919002], [-2.1776969788, -1.0967711834, 23.3397340898], [-3.0286207468, -1.6150146556, 23.4254804867], [-3.3651880827, -2.1548481758, 22.6539221940], [-2.8508316505, -2.1764382238, 21.7966175046], [-1.9999078825, -1.6581947516, 21.7108711078], [-1.6633405467, -1.1183612314, 22.4824294004], [-1.2979663237, -1.9566407698, 23.7864491896], [-1.8099590185, -2.7941108449, 23.9775181662], [-1.8996075655, -3.4972679942, 23.2721578601], [-1.4772634177, -3.3629550684, 22.3757285774], [-0.9652707230, -2.5254849933, 22.1846596009], [-0.8756221760, -1.8223278440, 22.8900199069], [-0.1475241757, -2.2622078319, 24.2253143525], [-0.2189191108, -3.2157937233, 24.5178493265], [0.0247597976, -3.9520445400, 23.8865369438], [0.3398336411, -3.7347094653, 22.9626895871], [0.4112285762, -2.7811235739, 22.6701546131], [0.1675496678, -2.0448727572, 23.3014669958], [0.9697611879, -1.9682631225, 24.6552591684], [1.3247857761, -2.8171316652, 25.0468964227], [1.9102022931, -3.4142968317, 24.4985523105], [2.1405942220, -3.1625934556, 23.5585709438], [1.7855696337, -2.3137249129, 23.1669336895], [1.2001531167, -1.7165597463, 23.7152778018], [1.7725320943, -1.1800625600, 25.0744587591], [2.4339754140, -1.7483068469, 25.5639392646], [3.2753994320, -2.0403969429, 25.1093086479], [3.4553801304, -1.7642427521, 24.1651975257], [2.7939368107, -1.1959984652, 23.6757170202], [1.9525127927, -0.9039083691, 24.1303476369], [2.0874521450, 0.1012441968, 25.5289810866], [2.8302721185, -0.2842540776, 26.0763471134], [3.7428199735, -0.3854982744, 25.6801072556], [3.9125478550, -0.1012441968, 24.7365013709], [3.1697278815, 0.2842540776, 24.1891353440], [2.2571800265, 0.3854982744, 24.5853752019], [3.0000000000, 0.0000000000, -0.0000000000], [3.0000000000, -0.0000000000, 25.1327412287]]);
	polyhedron(convexity = 10, faces = [[0, 6, 1], [1, 6, 7], [1, 7, 2], [2, 7, 8], [2, 8, 3], [3, 8, 9], [3, 9, 4], [4, 9, 10], [4, 10, 5], [5, 10, 11], [5, 11, 0], [0, 11, 6], [6, 12, 7], [7, 12, 13], [7, 13, 8], [8, 13, 14], [8, 14, 9], [9, 14, 15], [9, 15, 10], [10, 15, 16], [10, 16, 11], [11, 16, 17], [11, 17, 6], [6, 17, 12], [12, 18, 13], [13, 18, 19], [13, 19, 14], [14, 19, 20], [14, 20, 15], [15, 20, 21], [15, 21, 16], [16, 21, 22], [16, 22, 17], [17, 22, 23], [17, 23, 12], [12, 23, 18], [18, 24, 19], [19, 24, 25], [19, 25, 20], [20, 25, 26], [20, 26, 21], [21, 26, 27], [21, 27, 22], [22, 27, 28], [22, 28, 23], [23, 28, 29], [23, 29, 18], [18, 29, 24], [24, 30, 25], [25, 30, 31], [25, 31, 26], [26, 31, 32], [26, 32, 27], [27, 32, 33], [27, 33, 28], [28, 33, 34], [28, 34, 29], [29, 34, 35], [29, 35, 24], [24, 35, 30], [30, 36, 31], [31, 36, 37], [31, 37, 32], [32, 37, 38], [32, 38, 33], [33, 38, 39], [33, 39, 34], [34, 39, 40], [34, 40, 35], [35, 40, 41], [35, 41, 30], [30, 41, 36], [36, 42, 37], [37, 42, 43], [37, 43, 38], [38, 43, 44], [38, 44, 39], [39, 44, 45], [39, 45, 40], [40, 45, 46], [40, 46, 41], [41, 46, 47], [41, 47, 36], [36, 47, 42], [42, 48, 43], [43, 48, 49], [43, 49, 44], [44, 49, 50], [44, 50, 45], [45, 50, 51], [45, 51, 46], [46, 51, 52], [46, 52, 47], [47, 52, 53], [47, 53, 42], [42, 53, 48], [48, 54, 49], [49, 54, 55], [49, 55, 50], [50, 55, 56], [50, 56, 51], [51, 56, 57], [51, 57, 52], [52, 57, 58], [52, 58, 53], [53, 58, 59], [53, 59, 48], [48, 59, 54], [1, 60, 0], [54, 61, 55], [2, 60, 1], [55, 61, 56], [3, 60, 2], [56, 61, 57], [4, 60, 3], [57, 61, 58], [5, 60, 4], [58, 61, 59], [0, 60, 5], [59, 61, 54]], points = [[0.0000000000, 0.0000000000, 1.0000000000], [0.0000000000, -0.8660254038, 0.5000000000], [0.0000000000, -0.8660254038, -0.5000000000], [0.0000000000, -0.0000000000, -1.0000000000], [0.0000000000, 0.8660254038, -0.5000000000], [0.0000000000, 0.8660254038, 0.5000000000], [1.0000000000, 0.0000000000, 1.0000000000], [1.0000000000, -0.8660254038, 0.5000000000], [1.0000000000, -0.8660254038, -0.5000000000], [1.0000000000, -0.0000000000, -1.0000000000], [1.0000000000, 0.8660254038, -0.5000000000], [1.0000000000, 0.8660254038, 0.5000000000], [2.0000000000, 0.0000000000, 1.0000000000], [2.0000000000, -0.8660254038, 0.5000000000], [2.0000000000, -0.8660254038, -0.5000000000], [2.0000000000, -0.0000000000, -1.0000000000], [2.0000000000, 0.8660254038, -0.5000000000], [2.0000000000, 0.8660254038, 0.5000000000], [3.0000000000, 0.0000000000, 1.0000000000], [3.0000000000, -0.8660254038, 0.5000000000], [3.0000000000, -0.8660254038, -0.5000000000], [3.0000000000, -0.0000000000, -1.0000000000], [3.0000000000, 0.8660254038, -0.5000000000], [3.0000000000, 0.8660254038, 0.5000000000], [4.0000000000, 0.0000000000, 1.0000000000], [4.0000000000, -0.8660254038, 0.5000000000], [4.0000000000, -0.8660254038, -0.5000000000], [4.0000000000, -0.0000000000, -1.0000000000], [4.0000000000, 0.8660254038, -0.5000000000], [4.0000000000, 0.8660254038, 0.5000000000], [5.0000000000, 0.0000000000, 1.0000000000], [5.0000000000, -0.8660254038, 0.5000000000], [5.0000000000, -0.8660254038, -0.5000000000], [5.0000000000, -0.0000000000, -1.0000000000], [5.0000000000, 0.8660254038, -0.5000000000], [5.0000000000, 0.8660254038, 0.5000000000], [6.0000000000, 0.0000000000, 1.0000000000], [6.0000000000, -0.8660254038, 0.5000000000], [6.0000000000, -0.8660254038, -0.5000000000], [6.0000000000, -0.0000000000, -1.0000000000], [6.0000000000, 0.8660254038, -0.5000000000], [6.0000000000, 0.8660254038, 0.5000000000], [7.0000000000, 0.0000000000, 1.0000000000], [7.0000000000, -0.8660254038, 0.5000000000], [7.0000000000, -0.8660254038, -0.5000000000], [7.0000000000, -0.0000000000, -1.0000000000], [7.0000000000, 0.8660254038, -0.5000000000], [7.0000000000, 0.8660254038, 0.5000000000], [8.0000000000, 0.0000000000, 1.0000000000], [8.0000000000, -0.8660254038, 0.5000000000], [8.0000000000, -0.8660254038, -0.5000000000], [8.0000000000, -0.0000000000, -1.0000000000], [8.0000000000, 0.8660254038, -0.5000000000], [8.0000000000, 0.8660254038, 0.5000000000], [9.0000000000, 0.0000000000, 1.0000000000], [9.0000000000, -0.8660254038, 0.5000000000], [9.0000000000, -0.8660254038, -0.5000000000], [9.0000000000, -0.0000000000, -1.0000000000], [9.0000000000, 0.8660254038, -0.5000000000], [9.0000000000, 0.8660254038, 0.5000000000], [0.0000000000, -0.0000000000, -0.0000000000], [9.0000000000, -0.0000000000, -0.0000000000]]);
	polyhedron(convexity = 10, faces = [[0, 6, 1], [1, 6, 7], [1, 7, 2], [2, 7, 8], [2, 8, 3], [3, 8, 9], [3, 9, 4], [4, 9, 10], [4, 10, 5], [5, 10, 11], [5, 11, 0], [0, 11, 6], [6, 12, 7], [7, 12, 13], [7, 13, 8], [8, 13, 14], [8, 14, 9], [9, 14, 15], [9, 15, 10], [10, 15, 16], [10, 16, 11], [11, 16, 17], [11, 17, 6], [6, 17, 12], [12, 18, 13], [13, 18, 19], [13, 19, 14], [14, 19, 20], [14, 20, 15], [15, 20, 21], [15, 21, 16], [16, 21, 22], [16, 22, 17], [17, 22, 23], [17, 23, 12], [12, 23, 18], [18, 24, 19], [19, 24, 25], [19, 25, 20], [20, 25, 26], [20, 26, 21], [21, 26, 27], [21, 27, 22], [22, 27, 28], [22, 28, 23], [23, 28, 29], [23, 29, 18], [18, 29, 24], [24, 30, 25], [25, 30, 31], [25, 31, 26], [26, 31, 32], [26, 32, 27], [27, 32, 33], [27, 33, 28], [28, 33, 34], [28, 34, 29], [29, 34, 35], [29, 35, 24], [24, 35, 30], [30, 36, 31], [31, 36, 37], [31, 37, 32], [32, 37, 38], [32, 38, 33], [33, 38, 39], [33, 39, 34], [34, 39, 40], [34, 40, 35], [35, 40, 41], [35, 41, 30], [30, 41, 36], [36, 42, 37], [37, 42, 43], [37, 43, 38], [38, 43, 44], [38, 44, 39], [39, 44, 45], [39, 45, 40], [40, 45, 46], [40, 46, 41], [41, 46, 47], [41, 47, 36], [36, 47, 42], [42, 48, 43], [43, 48, 49], [43, 49, 44], [44, 49, 50], [44, 50, 45], [45, 50, 51], [45, 51, 46], [46, 51, 52], [46, 52, 47], [47, 52, 53], [47, 53, 42], [42, 53, 48], [48, 54, 49], [49, 54, 55], [49, 55, 50], [50, 55, 56], [50, 56, 51], [51, 56, 57], [51, 57, 52], [52, 57, 58], [52, 58, 53], [53, 58, 59], [53, 59, 48], [48, 59, 54], [1, 60, 0], [54, 61, 55], [2, 60, 1], [55, 61, 56], [3, 60, 2], [56, 61, 57], [4, 60, 3], [57, 61, 58], [5, 60, 4], [58, 61, 59], [0, 60, 5], [59, 61, 54]], points = [[0.0000000000, 0.0000000000, 1.0000000000], [0.8660254038, 0.0000000000, 0.5000000000], [0.8660254038, 0.0000000000, -0.5000000000], [0.0000000000, 0.0000000000, -1.0000000000], [-0.8660254038, 0.0000000000, -0.5000000000], [-0.8660254038, 0.0000000000, 0.5000000000], [0.0000000000, 1.0000000000, 1.0000000000], [0.8660254038, 1.0000000000, 0.5000000000], [0.8660254038, 1.0000000000, -0.5000000000], [0.0000000000, 1.0000000000, -1.0000000000], [-0.8660254038, 1.0000000000, -0.5000000000], [-0.8660254038, 1.0000000000, 0.5000000000], [0.0000000000, 2.0000000000, 1.0000000000], [0.8660254038, 2.0000000000, 0.5000000000], [0.8660254038, 2.0000000000, -0.5000000000], [0.0000000000, 2.0000000000, -1.0000000000], [-0.8660254038, 2.0000000000, -0.5000000000], [-0.8660254038, 2.0000000000, 0.5000000000], [0.0000000000, 3.0000000000, 1.0000000000], [0.8660254038, 3.0000000000, 0.5000000000], [0.8660254038, 3.0000000000, -0.5000000000], [0.0000000000, 3.0000000000, -1.0000000000], [-0.8660254038, 3.0000000000, -0.5000000000], [-0.8660254038, 3.0000000000, 0.5000000000], [0.0000000000, 4.0000000000, 1.0000000000], [0.8660254038, 4.0000000000, 0.5000000000], [0.8660254038, 4.0000000000, -0.5000000000], [0.0000000000, 4.0000000000, -1.0000000000], [-0.8660254038, 4.0000000000, -0.5000000000], [-0.8660254038, 4.0000000000, 0.5000000000], [0.0000000000, 5.0000000000, 1.0000000000], [0.8660254038, 5.0000000000, 0.5000000000], [0.8660254038, 5.0000000000, -0.5000000000], [0.0000000000, 5.0000000000, -1.0000000000], [-0.8660254038, 5.0000000000, -0.5000000000], [-0.8660254038, 5.0000000000, 0.5000000000], [0.0000000000, 6.0000000000, 1.0000000000], [0.8660254038, 6.0000000000, 0.5000000000], [0.8660254038, 6.0000000000, -0.5000000000], [0.0000000000, 6.0000000000, -1.0000000000], [-0.8660254038, 6.0000000000, -0.5000000000], [-0.8660254038, 6.0000000000, 0.5000000000], [0.0000000000, 7.0000000000, 1.0000000000], [0.8660254038, 7.0000000000, 0.5000000000], [0.8660254038, 7.0000000000, -0.5000000000], [0.0000000000, 7.0000000000, -1.0000000000], [-0.8660254038, 7.0000000000, -0.5000000000], [-0.8660254038, 7.0000000000, 0.5000000000], [0.0000000000, 8.0000000000, 1.0000000000], [0.8660254038, 8.0000000000, 0.5000000000], [0.8660254038, 8.0000000000, -0.5000000000], [0.0000000000, 8.0000000000, -1.0000000000], [-0.8660254038, 8.0000000000, -0.5000000000], [-0.8660254038, 8.0000000000, 0.5000000000], [0.0000000000, 9.0000000000, 1.0000000000], [0.8660254038, 9.0000000000, 0.5000000000], [0.8660254038, 9.0000000000, -0.5000000000], [0.0000000000, 9.0000000000, -1.0000000000], [-0.8660254038, 9.0000000000, -0.5000000000], [-0.8660254038, 9.0000000000, 0.5000000000], [0.0000000000, 0.0000000000, -0.0000000000], [0.0000000000, 9.0000000000, -0.0000000000]]);
	polyhedron(convexity = 10, faces = [[0, 6, 1], [1, 6, 7], [1, 7, 2], [2, 7, 8], [2, 8, 3], [3, 8, 9], [3, 9, 4], [4, 9, 10], [4, 10, 5], [5, 10, 11], [5, 11, 0], [0, 11, 6], [6, 12, 7], [7, 12, 13], [7, 13, 8], [8, 13, 14], [8, 14, 9], [9, 14, 15], [9, 15, 10], [10, 15, 16], [10, 16, 11], [11, 16, 17], [11, 17, 6], [6, 17, 12], [12, 18, 13], [13, 18, 19], [13, 19, 14], [14, 19, 20], [14, 20, 15], [15, 20, 21], [15, 21, 16], [16, 21, 22], [16, 22, 17], [17, 22, 23], [17, 23, 12], [12, 23, 18], [18, 24, 19], [19, 24, 25], [19, 25, 20], [20, 25, 26], [20, 26, 21], [21, 26, 27], [21, 27, 22], [22, 27, 28], [22, 28, 23], [23, 28, 29], [23, 29, 18], [18, 29, 24], [24, 30, 25], [25, 30, 31], [25, 31, 26], [26, 31, 32], [26, 32, 27], [27, 32, 33], [27, 33, 28], [28, 33, 34], [28, 34, 29], [29, 34, 35], [29, 35, 24], [24, 35, 30], [30, 36, 31], [31, 36, 37], [31, 37, 32], [32, 37, 38], [32, 38, 33], [33, 38, 39], [33, 39, 34], [34, 39, 40], [34, 40, 35], [35, 40, 41], [35, 41, 30], [30, 41, 36], [36, 42, 37], [37, 42, 43], [37, 43, 38], [38, 43, 44], [38, 44, 39], [39, 44, 45], [39, 45, 40], [40, 45, 46], [40, 46, 41], [41, 46, 47], [41, 47, 36], [36, 47, 42], [42, 48, 43], [43, 48, 49], [43, 49, 44], [44, 49, 50], [44, 50, 45], [45, 50, 51], [45, 51, 46], [46, 51, 52], [46, 52, 47], [47, 52, 53], [47, 53, 42], [42, 53, 48], [48, 54, 49], [49, 54, 55], [49, 55, 50], [50, 55, 56], [50, 56, 51], [51, 56, 57], [51, 57, 52], [52, 57, 58], [52, 58, 53], [53, 58, 59], [53, 59, 48], [48, 59, 54], [1, 60, 0], [54, 61, 55], [2, 60, 1], [55, 61, 56], [3, 60, 2], [56, 61, 57], [4, 60, 3], [57, 61, 58], [5, 60, 4], [58, 61, 59], [0, 60, 5], [59, 61, 54]], points = [[1.0000000000, 0.0000000000, 0.0000000000], [0.5000000000, 0.8660254038, 0.0000000000], [-0.5000000000, 0.8660254038, 0.0000000000], [-1.0000000000, 0.0000000000, 0.0000000000], [-0.5000000000, -0.8660254038, 0.0000000000], [0.5000000000, -0.8660254038, 0.0000000000], [1.0000000000, 0.0000000000, 1.0000000000], [0.5000000000, 0.8660254038, 1.0000000000], [-0.5000000000, 0.8660254038, 1.0000000000], [-1.0000000000, 0.0000000000, 1.0000000000], [-0.5000000000, -0.8660254038, 1.0000000000], [0.5000000000, -0.8660254038, 1.0000000000], [1.0000000000, 0.0000000000, 2.0000000000], [0.5000000000, 0.8660254038, 2.0000000000], [-0.5000000000, 0.8660254038, 2.0000000000], [-1.0000000000, 0.0000000000, 2.0000000000], [-0.5000000000, -0.8660254038, 2.0000000000], [0.5000000000, -0.8660254038, 2.0000000000], [1.0000000000, 0.0000000000, 3.0000000000], [0.5000000000, 0.8660254038, 3.0000000000], [-0.5000000000, 0.8660254038, 3.0000000000], [-1.0000000000, 0.0000000000, 3.0000000000], [-0.5000000000, -0.8660254038, 3.0000000000], [0.5000000000, -0.8660254038, 3.0000000000], [1.0000000000, 0.0000000000, 4.0000000000], [0.5000000000, 0.8660254038, 4.0000000000], [-0.5000000000, 0.8660254038, 4.0000000000], [-1.0000000000, 0.0000000000, 4.0000000000], [-0.5000000000, -0.8660254038, 4.0000000000], [0.5000000000, -0.8660254038, 4.0000000000], [1.0000000000, 0.0000000000, 5.0000000000], [0.5000000000, 0.8660254038, 5.0000000000], [-0.5000000000, 0.8660254038, 5.0000000000], [-1.0000000000, 0.0000000000, 5.0000000000], [-0.5000000000, -0.8660254038, 5.0000000000], [0.5000000000, -0.8660254038, 5.0000000000], [1.0000000000, 0.0000000000, 6.0000000000], [0.5000000000, 0.8660254038, 6.0000000000], [-0.5000000000, 0.8660254038, 6.0000000000], [-1.0000000000, 0.0000000000, 6.0000000000], [-0.5000000000, -0.8660254038, 6.0000000000], [0.5000000000, -0.8660254038, 6.0000000000], [1.0000000000, 0.0000000000, 7.0000000000], [0.5000000000, 0.8660254038, 7.0000000000], [-0.5000000000, 0.8660254038, 7.0000000000], [-1.0000000000, 0.0000000000, 7.0000000000], [-0.5000000000, -0.8660254038, 7.0000000000], [0.5000000000, -0.8660254038, 7.0000000000], [1.0000000000, 0.0000000000, 8.0000000000], [0.5000000000, 0.8660254038, 8.0000000000], [-0.5000000000, 0.8660254038, 8.0000000000], [-1.0000000000, 0.0000000000, 8.0000000000], [-0.5000000000, -0.8660254038, 8.0000000000], [0.5000000000, -0.8660254038, 8.0000000000], [1.0000000000, 0.0000000000, 9.0000000000], [0.5000000000, 0.8660254038, 9.0000000000], [-0.5000000000, 0.8660254038, 9.0000000000], [-1.0000000000, 0.0000000000, 9.0000000000], [-0.5000000000, -0.8660254038, 9.0000000000], [0.5000000000, -0.8660254038, 9.0000000000], [-0.0000000000, 0.0000000000, 0.0000000000], [-0.0000000000, 0.0000000000, 9.0000000000]]);
}
